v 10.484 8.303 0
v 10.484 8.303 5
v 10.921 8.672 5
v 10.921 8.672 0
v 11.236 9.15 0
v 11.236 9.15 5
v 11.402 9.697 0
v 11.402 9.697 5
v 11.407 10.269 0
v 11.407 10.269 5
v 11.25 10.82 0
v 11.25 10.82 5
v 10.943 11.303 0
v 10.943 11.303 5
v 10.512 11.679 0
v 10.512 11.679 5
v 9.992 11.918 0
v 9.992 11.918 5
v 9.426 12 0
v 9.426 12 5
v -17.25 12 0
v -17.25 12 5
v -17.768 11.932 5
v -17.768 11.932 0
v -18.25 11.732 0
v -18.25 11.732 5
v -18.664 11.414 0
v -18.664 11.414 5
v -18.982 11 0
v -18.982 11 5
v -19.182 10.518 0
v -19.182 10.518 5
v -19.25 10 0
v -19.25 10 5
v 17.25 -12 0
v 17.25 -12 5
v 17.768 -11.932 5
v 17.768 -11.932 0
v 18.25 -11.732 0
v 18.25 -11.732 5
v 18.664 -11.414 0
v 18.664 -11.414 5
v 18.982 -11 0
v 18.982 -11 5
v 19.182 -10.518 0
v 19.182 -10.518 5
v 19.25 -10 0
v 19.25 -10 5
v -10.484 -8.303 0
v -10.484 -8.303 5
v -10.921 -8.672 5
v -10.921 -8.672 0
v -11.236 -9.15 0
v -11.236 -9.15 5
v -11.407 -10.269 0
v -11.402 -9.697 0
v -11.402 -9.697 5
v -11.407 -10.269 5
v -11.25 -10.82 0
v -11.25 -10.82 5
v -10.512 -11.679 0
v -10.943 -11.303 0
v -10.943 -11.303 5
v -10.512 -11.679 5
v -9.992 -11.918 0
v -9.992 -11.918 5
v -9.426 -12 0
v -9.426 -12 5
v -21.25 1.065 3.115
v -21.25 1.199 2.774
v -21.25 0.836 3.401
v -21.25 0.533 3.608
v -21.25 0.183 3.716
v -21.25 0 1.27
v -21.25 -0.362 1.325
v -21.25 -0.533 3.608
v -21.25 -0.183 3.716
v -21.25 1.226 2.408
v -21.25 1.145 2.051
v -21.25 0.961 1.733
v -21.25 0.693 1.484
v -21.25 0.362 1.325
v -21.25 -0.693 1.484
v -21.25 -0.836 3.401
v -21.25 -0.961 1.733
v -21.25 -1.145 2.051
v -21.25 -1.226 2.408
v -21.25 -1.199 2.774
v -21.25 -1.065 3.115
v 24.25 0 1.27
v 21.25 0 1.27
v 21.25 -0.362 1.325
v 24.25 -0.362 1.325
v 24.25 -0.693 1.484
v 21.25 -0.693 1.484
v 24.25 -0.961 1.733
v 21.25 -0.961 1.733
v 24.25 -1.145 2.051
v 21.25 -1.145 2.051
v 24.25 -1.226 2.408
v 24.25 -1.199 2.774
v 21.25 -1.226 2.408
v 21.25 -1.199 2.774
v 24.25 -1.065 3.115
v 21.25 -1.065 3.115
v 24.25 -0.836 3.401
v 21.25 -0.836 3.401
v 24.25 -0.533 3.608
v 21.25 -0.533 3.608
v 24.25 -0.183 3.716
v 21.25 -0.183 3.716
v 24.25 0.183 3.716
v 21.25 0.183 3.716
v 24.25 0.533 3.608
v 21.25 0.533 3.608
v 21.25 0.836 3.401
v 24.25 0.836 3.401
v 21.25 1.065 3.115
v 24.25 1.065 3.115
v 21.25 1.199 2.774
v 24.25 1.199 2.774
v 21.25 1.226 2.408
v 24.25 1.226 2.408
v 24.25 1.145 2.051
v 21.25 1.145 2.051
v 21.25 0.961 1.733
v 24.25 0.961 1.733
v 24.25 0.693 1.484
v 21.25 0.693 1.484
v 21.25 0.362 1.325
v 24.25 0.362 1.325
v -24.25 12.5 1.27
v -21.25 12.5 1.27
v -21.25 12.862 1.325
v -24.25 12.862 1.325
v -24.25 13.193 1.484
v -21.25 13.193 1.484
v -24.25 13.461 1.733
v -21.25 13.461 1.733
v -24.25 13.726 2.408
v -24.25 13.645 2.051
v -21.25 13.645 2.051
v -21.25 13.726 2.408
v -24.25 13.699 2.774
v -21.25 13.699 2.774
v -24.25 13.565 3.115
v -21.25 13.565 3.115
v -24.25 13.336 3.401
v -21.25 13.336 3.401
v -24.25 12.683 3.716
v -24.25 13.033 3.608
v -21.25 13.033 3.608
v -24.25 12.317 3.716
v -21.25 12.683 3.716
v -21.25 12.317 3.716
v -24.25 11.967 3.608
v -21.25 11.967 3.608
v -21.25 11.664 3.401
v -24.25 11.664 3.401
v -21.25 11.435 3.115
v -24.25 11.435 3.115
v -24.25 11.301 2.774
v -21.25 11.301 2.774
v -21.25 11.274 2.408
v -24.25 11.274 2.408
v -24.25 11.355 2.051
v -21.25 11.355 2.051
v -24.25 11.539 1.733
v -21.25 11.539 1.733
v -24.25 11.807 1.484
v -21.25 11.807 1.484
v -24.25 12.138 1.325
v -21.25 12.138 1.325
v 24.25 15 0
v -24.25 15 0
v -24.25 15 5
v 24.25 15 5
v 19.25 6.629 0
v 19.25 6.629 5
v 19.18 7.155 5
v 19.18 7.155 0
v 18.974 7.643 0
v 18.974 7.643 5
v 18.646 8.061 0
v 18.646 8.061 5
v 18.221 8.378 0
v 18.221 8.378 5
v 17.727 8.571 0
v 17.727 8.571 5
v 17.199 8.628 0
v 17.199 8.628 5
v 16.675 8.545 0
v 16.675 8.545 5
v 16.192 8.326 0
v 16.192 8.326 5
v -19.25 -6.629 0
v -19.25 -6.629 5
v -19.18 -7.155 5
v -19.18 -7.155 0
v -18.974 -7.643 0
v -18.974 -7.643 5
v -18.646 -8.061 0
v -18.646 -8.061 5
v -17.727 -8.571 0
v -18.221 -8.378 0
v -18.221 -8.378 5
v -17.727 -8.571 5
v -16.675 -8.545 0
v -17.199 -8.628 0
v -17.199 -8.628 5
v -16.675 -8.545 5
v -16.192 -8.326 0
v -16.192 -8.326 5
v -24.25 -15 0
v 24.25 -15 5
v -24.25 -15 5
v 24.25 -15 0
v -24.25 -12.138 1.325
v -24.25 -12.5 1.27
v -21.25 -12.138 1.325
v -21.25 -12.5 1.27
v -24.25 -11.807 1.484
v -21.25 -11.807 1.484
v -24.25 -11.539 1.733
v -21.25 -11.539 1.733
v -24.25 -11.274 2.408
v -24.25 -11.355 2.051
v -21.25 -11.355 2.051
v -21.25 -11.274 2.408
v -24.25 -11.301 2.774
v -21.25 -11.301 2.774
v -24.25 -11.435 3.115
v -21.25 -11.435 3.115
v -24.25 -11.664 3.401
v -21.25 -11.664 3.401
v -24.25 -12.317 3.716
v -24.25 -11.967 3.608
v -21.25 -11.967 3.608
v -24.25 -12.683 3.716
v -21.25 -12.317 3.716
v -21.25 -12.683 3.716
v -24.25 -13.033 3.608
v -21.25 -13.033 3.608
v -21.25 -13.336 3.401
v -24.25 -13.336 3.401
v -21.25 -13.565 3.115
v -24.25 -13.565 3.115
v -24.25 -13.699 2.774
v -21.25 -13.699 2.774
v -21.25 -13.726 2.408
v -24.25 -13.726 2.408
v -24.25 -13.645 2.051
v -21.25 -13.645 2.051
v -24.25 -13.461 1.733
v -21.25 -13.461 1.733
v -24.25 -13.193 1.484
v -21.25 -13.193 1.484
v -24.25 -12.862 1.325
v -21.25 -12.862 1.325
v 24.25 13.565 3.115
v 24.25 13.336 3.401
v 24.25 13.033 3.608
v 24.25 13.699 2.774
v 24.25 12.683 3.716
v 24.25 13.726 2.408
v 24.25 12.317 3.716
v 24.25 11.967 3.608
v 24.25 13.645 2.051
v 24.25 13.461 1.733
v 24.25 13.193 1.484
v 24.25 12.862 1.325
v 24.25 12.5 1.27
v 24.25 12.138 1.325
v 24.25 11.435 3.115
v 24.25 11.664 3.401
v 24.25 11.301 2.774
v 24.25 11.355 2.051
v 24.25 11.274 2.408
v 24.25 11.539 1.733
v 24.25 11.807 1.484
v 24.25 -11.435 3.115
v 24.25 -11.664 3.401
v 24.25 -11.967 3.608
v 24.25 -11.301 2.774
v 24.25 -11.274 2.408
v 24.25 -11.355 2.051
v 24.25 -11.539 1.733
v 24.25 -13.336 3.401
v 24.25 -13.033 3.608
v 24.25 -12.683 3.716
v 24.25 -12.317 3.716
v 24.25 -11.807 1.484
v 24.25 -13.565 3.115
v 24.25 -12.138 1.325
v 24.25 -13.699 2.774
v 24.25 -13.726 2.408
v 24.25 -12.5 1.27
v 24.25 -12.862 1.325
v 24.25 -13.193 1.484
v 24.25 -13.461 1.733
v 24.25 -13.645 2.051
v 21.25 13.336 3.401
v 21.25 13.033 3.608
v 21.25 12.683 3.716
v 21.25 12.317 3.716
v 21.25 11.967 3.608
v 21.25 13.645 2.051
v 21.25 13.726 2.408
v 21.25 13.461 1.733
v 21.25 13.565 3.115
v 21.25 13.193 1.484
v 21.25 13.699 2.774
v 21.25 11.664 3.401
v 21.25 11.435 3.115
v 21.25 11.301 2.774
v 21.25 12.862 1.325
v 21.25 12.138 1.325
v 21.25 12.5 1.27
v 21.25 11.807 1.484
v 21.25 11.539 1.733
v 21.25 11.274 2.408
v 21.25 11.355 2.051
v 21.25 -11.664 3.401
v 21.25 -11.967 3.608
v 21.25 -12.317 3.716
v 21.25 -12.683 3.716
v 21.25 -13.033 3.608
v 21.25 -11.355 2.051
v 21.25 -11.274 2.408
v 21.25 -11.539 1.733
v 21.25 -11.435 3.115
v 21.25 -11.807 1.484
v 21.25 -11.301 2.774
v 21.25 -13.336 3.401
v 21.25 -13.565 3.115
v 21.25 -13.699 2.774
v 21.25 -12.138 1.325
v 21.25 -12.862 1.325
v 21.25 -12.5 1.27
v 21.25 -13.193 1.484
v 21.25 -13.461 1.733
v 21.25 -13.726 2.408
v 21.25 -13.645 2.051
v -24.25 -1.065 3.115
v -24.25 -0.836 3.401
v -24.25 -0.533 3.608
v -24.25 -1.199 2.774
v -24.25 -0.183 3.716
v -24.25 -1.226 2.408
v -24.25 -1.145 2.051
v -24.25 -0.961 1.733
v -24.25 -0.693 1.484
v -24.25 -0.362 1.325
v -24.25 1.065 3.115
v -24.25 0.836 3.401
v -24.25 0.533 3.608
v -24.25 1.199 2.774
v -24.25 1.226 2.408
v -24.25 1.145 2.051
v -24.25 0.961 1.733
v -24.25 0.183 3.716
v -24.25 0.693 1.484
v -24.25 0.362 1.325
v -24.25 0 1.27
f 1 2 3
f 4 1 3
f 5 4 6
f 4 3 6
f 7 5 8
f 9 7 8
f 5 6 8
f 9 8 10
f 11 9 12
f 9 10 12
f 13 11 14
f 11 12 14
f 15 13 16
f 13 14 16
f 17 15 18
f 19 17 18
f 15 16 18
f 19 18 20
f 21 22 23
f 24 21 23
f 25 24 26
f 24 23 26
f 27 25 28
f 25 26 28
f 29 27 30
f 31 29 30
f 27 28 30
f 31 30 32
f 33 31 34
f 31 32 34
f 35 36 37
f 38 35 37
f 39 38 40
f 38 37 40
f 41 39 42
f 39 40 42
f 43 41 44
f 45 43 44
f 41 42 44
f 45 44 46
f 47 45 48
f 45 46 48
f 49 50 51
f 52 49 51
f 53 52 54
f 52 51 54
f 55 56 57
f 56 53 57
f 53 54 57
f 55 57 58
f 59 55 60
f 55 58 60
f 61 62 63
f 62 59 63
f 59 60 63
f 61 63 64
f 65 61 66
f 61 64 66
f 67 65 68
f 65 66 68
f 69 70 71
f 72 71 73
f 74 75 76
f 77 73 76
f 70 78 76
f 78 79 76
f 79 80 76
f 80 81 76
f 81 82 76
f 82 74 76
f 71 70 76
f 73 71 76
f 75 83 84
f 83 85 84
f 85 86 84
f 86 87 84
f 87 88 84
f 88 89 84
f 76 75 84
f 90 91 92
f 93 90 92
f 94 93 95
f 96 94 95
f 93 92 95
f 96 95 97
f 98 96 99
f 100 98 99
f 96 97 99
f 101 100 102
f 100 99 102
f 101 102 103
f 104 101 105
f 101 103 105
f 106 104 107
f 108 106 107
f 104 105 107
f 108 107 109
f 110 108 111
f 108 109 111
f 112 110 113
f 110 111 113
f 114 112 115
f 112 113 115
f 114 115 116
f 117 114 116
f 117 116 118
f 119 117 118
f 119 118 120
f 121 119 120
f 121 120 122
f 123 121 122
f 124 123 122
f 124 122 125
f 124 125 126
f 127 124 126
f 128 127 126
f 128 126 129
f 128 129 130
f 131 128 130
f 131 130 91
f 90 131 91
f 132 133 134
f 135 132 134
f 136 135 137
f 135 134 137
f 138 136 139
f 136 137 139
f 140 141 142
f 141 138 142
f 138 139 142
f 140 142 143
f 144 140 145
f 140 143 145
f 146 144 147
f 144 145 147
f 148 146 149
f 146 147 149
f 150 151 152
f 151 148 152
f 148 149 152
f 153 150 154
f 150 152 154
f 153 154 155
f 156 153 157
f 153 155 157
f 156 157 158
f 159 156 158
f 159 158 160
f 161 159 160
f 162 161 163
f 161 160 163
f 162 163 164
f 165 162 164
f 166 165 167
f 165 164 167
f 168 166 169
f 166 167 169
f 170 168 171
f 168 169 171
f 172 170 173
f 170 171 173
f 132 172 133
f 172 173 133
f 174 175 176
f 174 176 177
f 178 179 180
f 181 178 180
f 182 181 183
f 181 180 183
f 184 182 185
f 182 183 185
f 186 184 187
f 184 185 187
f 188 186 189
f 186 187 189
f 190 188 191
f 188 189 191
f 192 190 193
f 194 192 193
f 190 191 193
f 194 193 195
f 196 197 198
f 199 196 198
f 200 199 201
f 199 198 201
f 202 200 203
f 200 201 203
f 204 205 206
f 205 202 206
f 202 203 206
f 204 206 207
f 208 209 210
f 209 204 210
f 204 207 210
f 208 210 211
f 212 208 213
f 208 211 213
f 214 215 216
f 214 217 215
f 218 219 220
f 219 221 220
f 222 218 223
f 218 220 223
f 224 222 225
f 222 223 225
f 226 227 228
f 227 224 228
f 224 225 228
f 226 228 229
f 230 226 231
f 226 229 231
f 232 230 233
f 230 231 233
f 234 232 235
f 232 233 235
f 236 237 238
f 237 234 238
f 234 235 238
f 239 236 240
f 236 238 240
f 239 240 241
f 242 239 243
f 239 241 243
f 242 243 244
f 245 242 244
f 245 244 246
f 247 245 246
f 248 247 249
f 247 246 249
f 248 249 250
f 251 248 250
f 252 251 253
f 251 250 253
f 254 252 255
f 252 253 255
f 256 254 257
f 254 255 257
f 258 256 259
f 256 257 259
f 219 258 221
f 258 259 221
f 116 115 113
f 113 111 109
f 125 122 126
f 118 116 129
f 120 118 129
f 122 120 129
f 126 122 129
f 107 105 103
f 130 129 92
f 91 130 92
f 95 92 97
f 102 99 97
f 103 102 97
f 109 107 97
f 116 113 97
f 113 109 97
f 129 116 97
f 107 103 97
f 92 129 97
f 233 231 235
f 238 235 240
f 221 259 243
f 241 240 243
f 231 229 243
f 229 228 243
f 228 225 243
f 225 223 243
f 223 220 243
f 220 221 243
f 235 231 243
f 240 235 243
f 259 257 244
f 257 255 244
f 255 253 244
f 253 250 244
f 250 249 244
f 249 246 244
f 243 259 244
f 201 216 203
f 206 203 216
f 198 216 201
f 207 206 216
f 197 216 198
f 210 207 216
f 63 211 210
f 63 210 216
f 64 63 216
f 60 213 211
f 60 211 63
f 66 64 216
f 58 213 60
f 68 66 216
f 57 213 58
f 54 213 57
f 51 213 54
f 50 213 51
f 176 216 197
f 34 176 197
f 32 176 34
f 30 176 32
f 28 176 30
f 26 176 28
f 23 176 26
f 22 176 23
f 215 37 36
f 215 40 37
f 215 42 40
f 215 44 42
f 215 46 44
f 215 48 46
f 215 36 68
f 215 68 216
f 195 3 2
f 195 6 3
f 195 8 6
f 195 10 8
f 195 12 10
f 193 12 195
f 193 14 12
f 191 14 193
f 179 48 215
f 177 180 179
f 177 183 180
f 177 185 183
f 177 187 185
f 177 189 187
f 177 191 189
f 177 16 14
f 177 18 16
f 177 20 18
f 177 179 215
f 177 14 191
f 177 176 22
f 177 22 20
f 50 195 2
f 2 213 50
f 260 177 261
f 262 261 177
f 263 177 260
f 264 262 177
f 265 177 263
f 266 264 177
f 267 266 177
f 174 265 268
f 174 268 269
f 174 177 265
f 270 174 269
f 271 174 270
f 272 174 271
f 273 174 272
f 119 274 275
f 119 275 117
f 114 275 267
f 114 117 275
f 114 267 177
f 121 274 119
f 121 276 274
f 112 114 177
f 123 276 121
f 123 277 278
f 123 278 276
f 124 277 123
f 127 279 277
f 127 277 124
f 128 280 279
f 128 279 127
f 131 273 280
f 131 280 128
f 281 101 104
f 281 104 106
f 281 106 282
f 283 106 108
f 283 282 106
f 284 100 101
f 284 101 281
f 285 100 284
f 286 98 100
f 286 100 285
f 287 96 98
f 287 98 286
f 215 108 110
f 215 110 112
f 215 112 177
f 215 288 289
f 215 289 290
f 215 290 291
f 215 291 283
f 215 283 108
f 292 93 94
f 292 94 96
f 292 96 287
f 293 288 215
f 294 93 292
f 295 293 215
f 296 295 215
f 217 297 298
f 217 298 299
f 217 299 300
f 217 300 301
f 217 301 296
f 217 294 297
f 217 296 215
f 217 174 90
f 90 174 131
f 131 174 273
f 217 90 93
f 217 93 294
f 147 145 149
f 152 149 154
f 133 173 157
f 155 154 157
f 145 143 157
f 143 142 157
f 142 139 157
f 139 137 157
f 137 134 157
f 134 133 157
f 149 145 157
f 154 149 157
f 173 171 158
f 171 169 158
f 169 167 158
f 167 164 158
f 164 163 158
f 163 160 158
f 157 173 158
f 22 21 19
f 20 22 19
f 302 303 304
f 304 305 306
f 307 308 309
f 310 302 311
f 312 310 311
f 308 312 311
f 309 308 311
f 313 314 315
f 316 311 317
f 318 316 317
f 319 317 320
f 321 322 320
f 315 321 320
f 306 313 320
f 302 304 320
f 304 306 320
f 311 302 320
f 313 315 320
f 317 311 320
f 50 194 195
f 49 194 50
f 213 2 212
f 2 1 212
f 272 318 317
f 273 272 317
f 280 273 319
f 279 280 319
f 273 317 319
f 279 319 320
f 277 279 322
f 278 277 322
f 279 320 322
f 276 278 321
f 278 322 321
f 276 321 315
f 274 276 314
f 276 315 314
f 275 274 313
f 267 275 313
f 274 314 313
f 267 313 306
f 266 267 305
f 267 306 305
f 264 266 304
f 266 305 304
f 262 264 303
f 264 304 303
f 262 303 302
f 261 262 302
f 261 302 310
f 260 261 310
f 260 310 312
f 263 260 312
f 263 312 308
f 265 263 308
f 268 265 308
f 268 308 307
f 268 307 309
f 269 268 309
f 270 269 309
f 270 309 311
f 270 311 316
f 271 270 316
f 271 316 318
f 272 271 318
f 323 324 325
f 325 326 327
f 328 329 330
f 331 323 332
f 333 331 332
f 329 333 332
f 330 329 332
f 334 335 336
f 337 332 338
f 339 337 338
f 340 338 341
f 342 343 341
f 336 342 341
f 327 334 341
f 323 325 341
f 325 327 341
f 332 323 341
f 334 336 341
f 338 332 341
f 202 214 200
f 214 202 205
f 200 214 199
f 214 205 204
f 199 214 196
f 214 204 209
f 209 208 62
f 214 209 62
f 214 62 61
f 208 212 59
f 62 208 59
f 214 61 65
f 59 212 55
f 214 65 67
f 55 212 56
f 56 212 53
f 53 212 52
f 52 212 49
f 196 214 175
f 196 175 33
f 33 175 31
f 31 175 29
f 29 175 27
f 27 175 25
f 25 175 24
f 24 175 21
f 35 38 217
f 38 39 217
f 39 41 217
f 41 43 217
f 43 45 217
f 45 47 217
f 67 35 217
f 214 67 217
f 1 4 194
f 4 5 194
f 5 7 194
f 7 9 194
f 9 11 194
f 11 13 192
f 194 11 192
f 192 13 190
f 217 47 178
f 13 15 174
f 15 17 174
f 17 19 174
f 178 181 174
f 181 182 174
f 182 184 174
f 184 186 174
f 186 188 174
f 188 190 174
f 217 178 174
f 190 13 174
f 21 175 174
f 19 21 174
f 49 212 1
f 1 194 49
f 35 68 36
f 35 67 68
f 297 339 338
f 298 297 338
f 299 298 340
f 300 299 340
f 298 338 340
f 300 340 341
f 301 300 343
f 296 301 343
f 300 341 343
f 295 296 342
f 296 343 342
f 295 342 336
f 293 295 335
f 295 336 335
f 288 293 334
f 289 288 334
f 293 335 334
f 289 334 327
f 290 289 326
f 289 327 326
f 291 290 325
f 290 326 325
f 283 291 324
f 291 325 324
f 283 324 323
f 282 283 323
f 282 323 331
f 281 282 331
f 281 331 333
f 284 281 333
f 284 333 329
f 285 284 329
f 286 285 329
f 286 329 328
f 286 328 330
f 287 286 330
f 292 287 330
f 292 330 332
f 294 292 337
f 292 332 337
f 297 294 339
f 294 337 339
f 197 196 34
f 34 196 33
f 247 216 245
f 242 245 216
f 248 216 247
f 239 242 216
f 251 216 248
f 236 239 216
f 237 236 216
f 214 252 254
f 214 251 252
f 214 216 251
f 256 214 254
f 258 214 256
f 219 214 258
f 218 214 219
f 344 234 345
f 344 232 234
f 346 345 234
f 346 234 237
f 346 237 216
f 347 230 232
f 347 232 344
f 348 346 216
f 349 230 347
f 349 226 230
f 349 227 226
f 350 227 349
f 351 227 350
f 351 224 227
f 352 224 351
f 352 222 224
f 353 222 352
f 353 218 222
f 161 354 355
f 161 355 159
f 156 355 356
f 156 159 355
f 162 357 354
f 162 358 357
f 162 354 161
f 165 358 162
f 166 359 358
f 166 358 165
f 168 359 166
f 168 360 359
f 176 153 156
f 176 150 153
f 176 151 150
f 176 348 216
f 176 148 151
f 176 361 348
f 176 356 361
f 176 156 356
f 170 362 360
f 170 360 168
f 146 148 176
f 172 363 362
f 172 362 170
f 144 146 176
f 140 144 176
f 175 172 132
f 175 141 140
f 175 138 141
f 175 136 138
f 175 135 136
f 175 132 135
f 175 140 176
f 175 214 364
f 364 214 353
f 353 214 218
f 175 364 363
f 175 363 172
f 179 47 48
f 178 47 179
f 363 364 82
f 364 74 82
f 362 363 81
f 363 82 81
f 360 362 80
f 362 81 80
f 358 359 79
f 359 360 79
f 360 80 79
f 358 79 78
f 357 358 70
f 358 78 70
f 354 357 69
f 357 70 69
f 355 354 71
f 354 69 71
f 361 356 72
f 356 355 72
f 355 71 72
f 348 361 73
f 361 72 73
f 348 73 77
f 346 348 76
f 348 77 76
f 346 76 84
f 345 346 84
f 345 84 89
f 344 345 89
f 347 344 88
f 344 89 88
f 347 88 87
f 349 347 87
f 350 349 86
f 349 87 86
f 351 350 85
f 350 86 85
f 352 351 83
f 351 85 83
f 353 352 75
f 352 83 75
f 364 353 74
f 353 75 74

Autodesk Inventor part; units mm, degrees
ref_plane "YZ Plane" through (0, 0, 0) normal (1, 0, 0) x (0, 1, 0)
ref_plane "XZ Plane" through (0, 0, 0) normal (0, 1, 0) x (-1, 0, 0)
ref_plane "XY Plane" through (0, 0, 0) normal (0, 0, 1) x (1, 0, 0)
sketch "スケッチ1" plane through (0, 0, 0) normal (0, 0, 1) x (1, 0, 0)
  line L0 (-24.25, 15) -> (24.25, 15)
  line L1 (24.25, 15) -> (24.25, -15)
  line L2 (24.25, -15) -> (-24.25, -15)
  line L3 (-24.25, -15) -> (-24.25, 15)
  line L4 (-19.25, 12) -> (19.25, 12) construction
  line L5 (19.25, 12) -> (19.25, -12) construction
  line L6 (19.25, -12) -> (-19.25, -12) construction
  line L7 (-19.25, -12) -> (-19.25, 12) construction
  line L8 (19.25, 12) -> (-19.25, -12) construction
  line L9 (-19.25, -10.2324) -> (-19.25, 12)
  line L10 (-19.25, 12) -> (16.4145, 12)
  line L11 (16.4145, 12) -> (-19.25, -10.2324)
  line L12 (-16.4145, -12) -> (19.25, -12)
  line L13 (19.25, -12) -> (19.25, 10.2324)
  line L14 (19.25, 10.2324) -> (-16.4145, -12)
  line L15 (-24.25, 12.5) -> (24.25, 12.5) construction
  line L16 (24.25, -12.5) -> (-24.25, -12.5) construction
  line L17 (24.25, 12.5) -> (24.25, -12.5) construction
  point P0 (0, 0)
  point P1 (0, 12)
  point P2 (0, 15)
  point P3 (19.25, 0)
  point P4 (24.25, 0)
  dimension "d0" = 5
  dimension "d1" = 3
  dimension "d2" = 1.5
  dimension "d3" = 25
  dimension "d4" = 2.5
  dimension "d16" = 48.5
extrude "押し出し1" add sketch "スケッチ1" along normal blind 5
sketch "スケッチ2" plane through (24.25, -15, 0) normal (1, 0, 0) x (0, 0, -1)
  line L0 (0, 30) -> (-5, 30) projected
  line L1 (-5, 0) -> (-5, 30) projected
  line L2 (0, 15) -> (-5, 15) construction
  point P0 (-2.5, 2.5)
  point P1 (-2.5, 15)
  point P2 (-2.5, 27.5)
  point P3 (-2.5, 30)
  dimension "d7" = 25
hole "穴1" at (24.25, -12.5, 2.5) at (24.25, 0, 2.5) at (24.25, 12.5, 2.5) direction (-1, 0, 0) diameter 2.459 depth 3 thread size "M3x0.5" class "6H" standard "ISO Metric profile"
mirror "ミラー1" about plane through (0, 0, 0) normal (1, 0, 0) of "穴1"
fillet "フィレット1" radius 2 6 edges at (-16.4145, -12, 2.5) (-19.25, -10.2324, 2.5) (19.25, 10.2324, 2.5) (19.25, -12, 2.5) (-19.25, 12, 2.5) (16.4145, 12, 2.5)
equation "\"d3\" = d5_1"
equation "\"d7\" = d3"
equation "\"d5_1\" = 25"
properties part number "リンク_ふともも_サブフレーム_1_2(予備案)" material "アルミニウム 2014-T4"
